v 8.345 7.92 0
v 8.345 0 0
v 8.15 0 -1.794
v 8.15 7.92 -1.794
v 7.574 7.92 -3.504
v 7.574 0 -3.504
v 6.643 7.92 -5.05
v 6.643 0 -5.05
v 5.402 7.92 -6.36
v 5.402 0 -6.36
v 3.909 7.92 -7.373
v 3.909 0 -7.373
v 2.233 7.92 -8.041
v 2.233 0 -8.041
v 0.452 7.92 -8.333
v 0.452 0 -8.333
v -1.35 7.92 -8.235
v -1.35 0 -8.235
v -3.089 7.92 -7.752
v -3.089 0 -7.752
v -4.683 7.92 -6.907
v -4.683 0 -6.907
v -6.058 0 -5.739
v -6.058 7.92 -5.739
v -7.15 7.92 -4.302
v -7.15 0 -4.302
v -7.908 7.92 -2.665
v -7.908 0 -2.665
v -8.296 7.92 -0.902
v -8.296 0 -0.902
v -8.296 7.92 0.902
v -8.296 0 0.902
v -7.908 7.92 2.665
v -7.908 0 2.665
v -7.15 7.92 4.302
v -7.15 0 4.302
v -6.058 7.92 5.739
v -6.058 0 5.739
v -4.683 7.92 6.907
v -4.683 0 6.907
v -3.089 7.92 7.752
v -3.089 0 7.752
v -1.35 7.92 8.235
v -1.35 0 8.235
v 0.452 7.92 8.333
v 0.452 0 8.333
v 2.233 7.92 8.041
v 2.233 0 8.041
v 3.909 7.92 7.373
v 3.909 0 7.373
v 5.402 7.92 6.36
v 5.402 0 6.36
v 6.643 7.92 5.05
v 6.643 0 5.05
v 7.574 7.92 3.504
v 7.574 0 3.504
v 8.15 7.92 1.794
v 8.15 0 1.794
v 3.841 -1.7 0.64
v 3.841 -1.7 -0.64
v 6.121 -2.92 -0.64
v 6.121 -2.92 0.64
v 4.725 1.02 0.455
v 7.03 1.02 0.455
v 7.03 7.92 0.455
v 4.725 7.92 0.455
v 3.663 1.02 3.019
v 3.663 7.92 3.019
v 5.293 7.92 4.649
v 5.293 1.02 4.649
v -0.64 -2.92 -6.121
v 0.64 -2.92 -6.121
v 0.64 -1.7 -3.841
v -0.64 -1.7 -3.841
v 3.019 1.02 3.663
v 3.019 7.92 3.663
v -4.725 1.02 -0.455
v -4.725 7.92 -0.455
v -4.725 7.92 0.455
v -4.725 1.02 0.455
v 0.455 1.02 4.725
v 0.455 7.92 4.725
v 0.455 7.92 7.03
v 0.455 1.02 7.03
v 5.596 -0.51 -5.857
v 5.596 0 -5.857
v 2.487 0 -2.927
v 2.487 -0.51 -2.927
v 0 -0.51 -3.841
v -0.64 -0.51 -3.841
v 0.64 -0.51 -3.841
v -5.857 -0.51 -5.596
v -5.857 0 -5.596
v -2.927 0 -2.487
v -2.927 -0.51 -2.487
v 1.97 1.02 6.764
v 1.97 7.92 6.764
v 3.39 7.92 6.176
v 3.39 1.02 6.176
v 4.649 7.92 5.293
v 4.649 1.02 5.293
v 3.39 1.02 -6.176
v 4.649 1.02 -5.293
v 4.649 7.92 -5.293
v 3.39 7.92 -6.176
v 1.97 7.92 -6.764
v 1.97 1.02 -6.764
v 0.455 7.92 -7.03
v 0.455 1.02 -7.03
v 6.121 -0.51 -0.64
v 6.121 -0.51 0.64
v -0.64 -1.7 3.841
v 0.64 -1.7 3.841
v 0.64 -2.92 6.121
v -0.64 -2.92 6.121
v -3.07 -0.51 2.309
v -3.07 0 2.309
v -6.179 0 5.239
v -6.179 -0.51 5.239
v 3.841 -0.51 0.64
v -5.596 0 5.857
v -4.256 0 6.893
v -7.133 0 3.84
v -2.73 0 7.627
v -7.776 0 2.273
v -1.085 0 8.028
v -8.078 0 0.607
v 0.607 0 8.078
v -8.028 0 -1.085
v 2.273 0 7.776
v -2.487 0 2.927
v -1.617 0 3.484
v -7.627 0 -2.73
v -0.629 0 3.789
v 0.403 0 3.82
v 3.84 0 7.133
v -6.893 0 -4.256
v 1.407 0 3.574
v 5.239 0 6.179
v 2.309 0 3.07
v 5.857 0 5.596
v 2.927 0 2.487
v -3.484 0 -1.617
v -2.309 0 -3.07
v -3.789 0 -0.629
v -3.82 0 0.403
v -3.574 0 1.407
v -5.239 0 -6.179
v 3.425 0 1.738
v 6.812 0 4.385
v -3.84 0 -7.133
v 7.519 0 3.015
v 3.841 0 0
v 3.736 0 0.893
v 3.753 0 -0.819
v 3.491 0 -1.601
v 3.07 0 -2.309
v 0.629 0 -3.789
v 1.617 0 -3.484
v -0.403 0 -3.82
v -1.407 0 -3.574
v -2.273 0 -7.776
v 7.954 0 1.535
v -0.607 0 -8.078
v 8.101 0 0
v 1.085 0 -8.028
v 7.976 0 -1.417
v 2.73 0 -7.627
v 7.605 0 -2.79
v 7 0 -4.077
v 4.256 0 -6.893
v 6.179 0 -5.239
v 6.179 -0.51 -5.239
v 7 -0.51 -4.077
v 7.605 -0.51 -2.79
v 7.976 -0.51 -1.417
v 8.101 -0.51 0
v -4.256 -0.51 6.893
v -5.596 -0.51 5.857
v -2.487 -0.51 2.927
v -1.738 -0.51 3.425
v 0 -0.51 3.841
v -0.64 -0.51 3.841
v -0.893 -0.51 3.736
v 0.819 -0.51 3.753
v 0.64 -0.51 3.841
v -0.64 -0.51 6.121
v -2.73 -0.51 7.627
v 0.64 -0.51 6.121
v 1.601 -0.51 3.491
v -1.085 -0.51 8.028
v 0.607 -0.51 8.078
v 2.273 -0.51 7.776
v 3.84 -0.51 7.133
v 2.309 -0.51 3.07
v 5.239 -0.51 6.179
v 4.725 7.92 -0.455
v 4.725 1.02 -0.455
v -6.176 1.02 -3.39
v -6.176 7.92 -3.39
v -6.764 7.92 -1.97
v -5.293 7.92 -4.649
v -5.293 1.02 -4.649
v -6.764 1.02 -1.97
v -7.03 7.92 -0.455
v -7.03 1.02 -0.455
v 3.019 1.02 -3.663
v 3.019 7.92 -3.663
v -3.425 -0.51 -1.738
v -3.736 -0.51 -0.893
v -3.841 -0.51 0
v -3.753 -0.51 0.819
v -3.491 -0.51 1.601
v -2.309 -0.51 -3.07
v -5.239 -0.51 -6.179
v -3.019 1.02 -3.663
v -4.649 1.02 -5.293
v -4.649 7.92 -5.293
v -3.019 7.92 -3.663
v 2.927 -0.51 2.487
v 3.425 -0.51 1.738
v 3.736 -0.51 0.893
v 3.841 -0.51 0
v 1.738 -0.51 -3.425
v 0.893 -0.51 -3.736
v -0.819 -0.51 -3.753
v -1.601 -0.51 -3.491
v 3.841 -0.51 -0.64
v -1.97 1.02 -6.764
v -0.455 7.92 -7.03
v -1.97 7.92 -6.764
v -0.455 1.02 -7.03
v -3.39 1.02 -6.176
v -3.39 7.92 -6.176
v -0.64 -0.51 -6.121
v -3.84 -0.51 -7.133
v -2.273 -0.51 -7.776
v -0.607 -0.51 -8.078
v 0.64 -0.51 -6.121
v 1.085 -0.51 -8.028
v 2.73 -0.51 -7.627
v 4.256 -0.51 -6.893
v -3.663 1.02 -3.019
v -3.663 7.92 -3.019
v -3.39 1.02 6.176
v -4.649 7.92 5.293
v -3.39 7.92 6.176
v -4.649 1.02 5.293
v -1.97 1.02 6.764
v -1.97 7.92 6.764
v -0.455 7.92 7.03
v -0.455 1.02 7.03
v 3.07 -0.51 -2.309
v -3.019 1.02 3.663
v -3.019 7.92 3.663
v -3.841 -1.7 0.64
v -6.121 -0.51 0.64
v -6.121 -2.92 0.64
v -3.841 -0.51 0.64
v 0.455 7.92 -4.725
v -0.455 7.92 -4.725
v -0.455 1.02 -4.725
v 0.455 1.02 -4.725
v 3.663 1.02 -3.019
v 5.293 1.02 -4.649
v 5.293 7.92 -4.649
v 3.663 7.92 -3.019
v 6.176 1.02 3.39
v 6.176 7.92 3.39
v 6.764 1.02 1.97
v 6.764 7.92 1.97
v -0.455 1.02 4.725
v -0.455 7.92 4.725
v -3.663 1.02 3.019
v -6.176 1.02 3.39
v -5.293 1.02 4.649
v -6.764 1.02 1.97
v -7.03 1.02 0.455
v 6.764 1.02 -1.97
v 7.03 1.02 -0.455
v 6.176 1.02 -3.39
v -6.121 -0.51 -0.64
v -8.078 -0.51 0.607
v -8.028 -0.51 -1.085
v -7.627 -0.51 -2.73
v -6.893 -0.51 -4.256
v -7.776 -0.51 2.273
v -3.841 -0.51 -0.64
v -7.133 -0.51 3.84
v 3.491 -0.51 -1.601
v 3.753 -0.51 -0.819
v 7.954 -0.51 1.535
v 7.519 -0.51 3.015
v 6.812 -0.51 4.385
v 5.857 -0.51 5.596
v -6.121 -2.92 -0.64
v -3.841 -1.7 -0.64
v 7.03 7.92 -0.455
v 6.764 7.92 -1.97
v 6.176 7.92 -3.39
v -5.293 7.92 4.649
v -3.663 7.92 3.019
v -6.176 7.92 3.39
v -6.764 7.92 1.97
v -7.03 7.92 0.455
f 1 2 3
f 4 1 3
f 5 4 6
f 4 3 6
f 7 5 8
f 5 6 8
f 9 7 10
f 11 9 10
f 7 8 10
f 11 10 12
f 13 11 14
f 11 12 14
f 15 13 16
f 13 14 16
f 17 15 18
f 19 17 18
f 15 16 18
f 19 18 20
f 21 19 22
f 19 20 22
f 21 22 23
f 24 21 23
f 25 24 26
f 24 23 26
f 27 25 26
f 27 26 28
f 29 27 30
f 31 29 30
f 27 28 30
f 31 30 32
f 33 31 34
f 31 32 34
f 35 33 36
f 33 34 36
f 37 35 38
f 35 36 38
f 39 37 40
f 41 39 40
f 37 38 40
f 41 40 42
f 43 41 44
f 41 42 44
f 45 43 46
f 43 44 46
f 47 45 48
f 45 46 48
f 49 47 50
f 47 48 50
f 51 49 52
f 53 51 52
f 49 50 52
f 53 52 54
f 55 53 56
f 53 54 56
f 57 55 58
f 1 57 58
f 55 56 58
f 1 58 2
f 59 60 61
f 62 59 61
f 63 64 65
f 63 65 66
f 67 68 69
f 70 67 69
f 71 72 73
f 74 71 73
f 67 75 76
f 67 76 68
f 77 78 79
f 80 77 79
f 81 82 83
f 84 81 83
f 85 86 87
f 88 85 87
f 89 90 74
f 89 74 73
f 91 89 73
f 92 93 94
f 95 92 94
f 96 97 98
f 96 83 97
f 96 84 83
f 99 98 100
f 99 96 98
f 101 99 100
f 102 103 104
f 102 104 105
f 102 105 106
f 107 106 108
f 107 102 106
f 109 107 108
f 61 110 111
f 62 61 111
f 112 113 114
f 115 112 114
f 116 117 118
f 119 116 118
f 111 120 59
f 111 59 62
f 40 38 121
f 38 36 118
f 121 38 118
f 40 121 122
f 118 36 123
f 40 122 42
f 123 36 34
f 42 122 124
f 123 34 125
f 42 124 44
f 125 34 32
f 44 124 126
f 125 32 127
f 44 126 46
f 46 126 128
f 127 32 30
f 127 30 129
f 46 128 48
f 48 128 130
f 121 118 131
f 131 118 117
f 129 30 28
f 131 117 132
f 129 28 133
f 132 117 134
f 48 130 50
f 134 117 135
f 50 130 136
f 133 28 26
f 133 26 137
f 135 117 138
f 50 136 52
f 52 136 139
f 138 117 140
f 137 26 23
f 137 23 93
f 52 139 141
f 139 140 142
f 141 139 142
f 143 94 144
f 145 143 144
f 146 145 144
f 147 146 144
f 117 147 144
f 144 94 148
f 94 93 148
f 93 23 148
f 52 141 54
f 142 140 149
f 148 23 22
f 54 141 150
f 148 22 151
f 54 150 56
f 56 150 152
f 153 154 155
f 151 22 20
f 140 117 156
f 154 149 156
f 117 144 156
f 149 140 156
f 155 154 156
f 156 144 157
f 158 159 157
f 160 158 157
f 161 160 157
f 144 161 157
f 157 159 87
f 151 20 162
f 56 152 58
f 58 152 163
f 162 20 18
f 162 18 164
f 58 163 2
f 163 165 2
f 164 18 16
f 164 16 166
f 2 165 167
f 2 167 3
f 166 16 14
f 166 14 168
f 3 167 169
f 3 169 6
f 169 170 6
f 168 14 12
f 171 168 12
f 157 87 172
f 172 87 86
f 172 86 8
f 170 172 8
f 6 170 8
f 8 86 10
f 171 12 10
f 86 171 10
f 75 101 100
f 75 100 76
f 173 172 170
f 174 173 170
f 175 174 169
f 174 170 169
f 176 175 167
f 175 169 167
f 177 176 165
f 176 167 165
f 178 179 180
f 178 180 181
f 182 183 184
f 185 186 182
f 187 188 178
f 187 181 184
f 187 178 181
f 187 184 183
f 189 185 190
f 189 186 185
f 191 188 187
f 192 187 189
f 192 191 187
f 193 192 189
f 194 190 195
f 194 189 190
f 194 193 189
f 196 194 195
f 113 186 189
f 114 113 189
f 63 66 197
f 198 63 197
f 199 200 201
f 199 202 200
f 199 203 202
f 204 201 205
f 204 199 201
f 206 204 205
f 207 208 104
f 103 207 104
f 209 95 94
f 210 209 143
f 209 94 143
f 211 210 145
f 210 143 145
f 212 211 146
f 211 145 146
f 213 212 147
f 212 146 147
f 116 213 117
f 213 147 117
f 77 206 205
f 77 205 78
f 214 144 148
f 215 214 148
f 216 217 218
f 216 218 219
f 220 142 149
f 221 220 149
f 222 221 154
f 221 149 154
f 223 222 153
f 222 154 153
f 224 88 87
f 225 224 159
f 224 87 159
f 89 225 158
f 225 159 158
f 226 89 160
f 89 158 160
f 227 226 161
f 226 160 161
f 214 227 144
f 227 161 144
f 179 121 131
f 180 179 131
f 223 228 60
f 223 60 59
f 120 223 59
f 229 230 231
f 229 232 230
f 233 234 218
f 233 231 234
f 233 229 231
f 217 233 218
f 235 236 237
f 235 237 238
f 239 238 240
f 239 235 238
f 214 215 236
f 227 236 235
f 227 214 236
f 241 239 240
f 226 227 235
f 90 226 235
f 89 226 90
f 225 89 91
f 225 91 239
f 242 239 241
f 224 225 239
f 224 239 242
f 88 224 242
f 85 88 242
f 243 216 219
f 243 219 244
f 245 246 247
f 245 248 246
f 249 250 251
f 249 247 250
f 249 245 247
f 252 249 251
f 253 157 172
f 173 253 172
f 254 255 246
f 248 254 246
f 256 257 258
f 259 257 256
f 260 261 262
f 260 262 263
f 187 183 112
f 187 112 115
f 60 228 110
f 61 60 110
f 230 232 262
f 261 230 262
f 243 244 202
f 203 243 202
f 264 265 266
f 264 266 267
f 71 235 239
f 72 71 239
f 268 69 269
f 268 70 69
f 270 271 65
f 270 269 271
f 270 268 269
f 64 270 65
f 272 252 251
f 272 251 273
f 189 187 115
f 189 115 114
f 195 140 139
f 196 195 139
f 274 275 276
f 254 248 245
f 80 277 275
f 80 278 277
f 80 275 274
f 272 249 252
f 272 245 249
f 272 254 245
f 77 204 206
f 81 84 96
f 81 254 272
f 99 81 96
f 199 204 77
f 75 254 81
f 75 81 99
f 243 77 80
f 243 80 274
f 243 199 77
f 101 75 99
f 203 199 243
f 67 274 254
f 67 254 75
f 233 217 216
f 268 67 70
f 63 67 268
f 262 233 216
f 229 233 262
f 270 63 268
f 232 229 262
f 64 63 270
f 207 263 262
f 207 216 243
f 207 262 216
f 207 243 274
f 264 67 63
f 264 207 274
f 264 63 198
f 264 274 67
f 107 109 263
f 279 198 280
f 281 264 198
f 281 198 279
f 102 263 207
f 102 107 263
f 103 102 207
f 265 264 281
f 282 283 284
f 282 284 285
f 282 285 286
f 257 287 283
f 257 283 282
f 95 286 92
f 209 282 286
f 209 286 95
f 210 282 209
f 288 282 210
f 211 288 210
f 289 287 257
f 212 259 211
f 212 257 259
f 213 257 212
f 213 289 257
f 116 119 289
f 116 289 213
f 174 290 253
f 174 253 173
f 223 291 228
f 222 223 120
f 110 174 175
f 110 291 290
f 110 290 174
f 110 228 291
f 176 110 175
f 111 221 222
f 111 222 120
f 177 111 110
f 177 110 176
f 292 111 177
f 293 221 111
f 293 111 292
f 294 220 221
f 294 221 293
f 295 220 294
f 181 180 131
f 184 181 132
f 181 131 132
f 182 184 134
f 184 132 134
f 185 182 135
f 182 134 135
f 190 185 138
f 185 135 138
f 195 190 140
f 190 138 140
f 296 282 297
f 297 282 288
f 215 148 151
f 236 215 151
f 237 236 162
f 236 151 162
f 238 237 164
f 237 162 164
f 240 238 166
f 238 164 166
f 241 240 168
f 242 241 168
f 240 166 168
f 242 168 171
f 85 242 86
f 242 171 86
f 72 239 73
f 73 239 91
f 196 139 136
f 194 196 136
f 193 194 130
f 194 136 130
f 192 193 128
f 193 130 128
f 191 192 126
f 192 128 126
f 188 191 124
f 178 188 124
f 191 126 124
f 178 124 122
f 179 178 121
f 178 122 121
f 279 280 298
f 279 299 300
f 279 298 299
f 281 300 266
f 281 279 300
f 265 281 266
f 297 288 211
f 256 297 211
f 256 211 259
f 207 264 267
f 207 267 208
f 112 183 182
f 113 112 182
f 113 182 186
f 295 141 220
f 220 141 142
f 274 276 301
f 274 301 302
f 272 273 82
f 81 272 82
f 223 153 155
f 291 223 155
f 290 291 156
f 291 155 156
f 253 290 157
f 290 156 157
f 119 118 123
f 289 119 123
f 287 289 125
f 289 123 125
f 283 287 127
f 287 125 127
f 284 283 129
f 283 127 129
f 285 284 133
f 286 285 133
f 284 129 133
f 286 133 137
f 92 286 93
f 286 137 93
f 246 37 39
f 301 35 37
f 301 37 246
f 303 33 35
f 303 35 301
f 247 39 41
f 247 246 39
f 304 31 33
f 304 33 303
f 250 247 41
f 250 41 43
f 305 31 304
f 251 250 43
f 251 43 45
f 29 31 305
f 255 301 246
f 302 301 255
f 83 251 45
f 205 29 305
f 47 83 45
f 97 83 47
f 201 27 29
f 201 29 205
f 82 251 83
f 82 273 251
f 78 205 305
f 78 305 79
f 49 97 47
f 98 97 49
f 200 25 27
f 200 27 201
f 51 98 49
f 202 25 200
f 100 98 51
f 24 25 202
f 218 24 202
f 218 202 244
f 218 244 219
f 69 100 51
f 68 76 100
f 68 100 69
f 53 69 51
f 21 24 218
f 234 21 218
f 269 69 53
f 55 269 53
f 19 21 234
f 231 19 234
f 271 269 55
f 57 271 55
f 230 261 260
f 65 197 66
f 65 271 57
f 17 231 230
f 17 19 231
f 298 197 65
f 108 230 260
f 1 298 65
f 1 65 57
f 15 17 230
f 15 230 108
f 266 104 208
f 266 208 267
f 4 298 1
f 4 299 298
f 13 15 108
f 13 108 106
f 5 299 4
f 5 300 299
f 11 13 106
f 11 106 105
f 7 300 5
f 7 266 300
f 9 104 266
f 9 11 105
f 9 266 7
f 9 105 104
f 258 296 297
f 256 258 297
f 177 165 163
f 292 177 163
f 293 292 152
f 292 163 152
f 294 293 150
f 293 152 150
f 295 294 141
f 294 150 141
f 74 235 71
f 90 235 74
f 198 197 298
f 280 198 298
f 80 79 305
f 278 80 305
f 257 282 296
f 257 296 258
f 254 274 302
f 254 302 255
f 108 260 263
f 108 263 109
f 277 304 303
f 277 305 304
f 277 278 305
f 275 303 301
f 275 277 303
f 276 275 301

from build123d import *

# Parameters (mm, degrees)
SKETCH1_R           = 8.345
SKETCH1_R_2         = 7.045
BOSS_EXTRUDE1_DEPTH = 7.92
SKETCH2_R           = 7.045000007
BOSS_EXTRUDE2_DEPTH = 1.02
BOSS_EXTRUDE3_REACH = 16.213
BOSS_EXTRUDE4_DEPTH = 0.51
SKETCH5_W           = 1.28
SKETCH5_H           = 2.28
SKETCH5_W_2         = 2.28
SKETCH5_H_2         = 1.28
BOSS_EXTRUDE5_DEPTH = 2.41
CUT_EXTRUDE1_DEPTH  = 15.597796067
CUT_EXTRUDE2_DEPTH  = 2.41
CUT_EXTRUDE3_DEPTH  = 2.41


with BuildPart() as part:
    # Sketch1 → Boss-Extrude1 (new body)
    with BuildSketch(Plane(origin=(0, 0, 0), x_dir=(1, 0, 0), z_dir=(0, 1, 0))):
        Circle(SKETCH1_R)
        Circle(SKETCH1_R_2, mode=Mode.SUBTRACT)
    extrude(amount=BOSS_EXTRUDE1_DEPTH)

    # Sketch2 → Boss-Extrude2 (add)
    with BuildSketch(Plane(origin=(0, 0, 0), x_dir=(1, 0, 0), z_dir=(0, 1, 0))):
        Circle(SKETCH2_R)
    extrude(amount=BOSS_EXTRUDE2_DEPTH)

    # Sketch3 → Boss-Extrude3 (add, up to next)
    with BuildSketch(Plane(origin=(0, 7.92, 0), x_dir=(1, 0, 0), z_dir=(0, 1, 0)), mode=Mode.PRIVATE) as boss_extrude3_sk1:
        with BuildLine():
            Line((-0.455000106, 4.724999874), (0.455000106, 4.724999874))
            Line((0.455000106, 4.724999874), (0.455000106, 8.332586627))
            ThreePointArc((0.455000106, 8.332586627), (0, 8.345), (-0.455000106, 8.332586627))
            Line((-0.455000106, 8.332586627), (-0.455000106, 4.724999874))
        make_face()
    boss_extrude3_tool1 = extrude(boss_extrude3_sk1.sketch, amount=-BOSS_EXTRUDE3_REACH, mode=Mode.PRIVATE) - part.part
    # Sketch3 → Boss-Extrude3 (add, up to next)
    with BuildSketch(Plane(origin=(0, 7.92, 0), x_dir=(1, 0, 0), z_dir=(0, 1, 0)), mode=Mode.PRIVATE) as boss_extrude3_sk2:
        with BuildLine():
            Line((3.019345792, 3.662813112), (5.570294849, 6.213762169))
            ThreePointArc((5.570294849, 6.213762169), (5.900806089, 5.900806089), (6.213762169, 5.570294849))
            Line((6.213762169, 5.570294849), (3.662813112, 3.019345792))
            Line((3.662813112, 3.019345792), (3.019345792, 3.662813112))
        make_face()
    boss_extrude3_tool2 = extrude(boss_extrude3_sk2.sketch, amount=-BOSS_EXTRUDE3_REACH, mode=Mode.PRIVATE) - part.part
    # Sketch3 → Boss-Extrude3 (add, up to next)
    with BuildSketch(Plane(origin=(0, 7.92, 0), x_dir=(1, 0, 0), z_dir=(0, 1, 0)), mode=Mode.PRIVATE) as boss_extrude3_sk3:
        with BuildLine():
            Line((4.724999874, 0.455000106), (8.332586627, 0.455000106))
            ThreePointArc((8.332586627, 0.455000106), (8.345, 0), (8.332586627, -0.455000106))
            Line((8.332586627, -0.455000106), (4.724999874, -0.455000106))
            Line((4.724999874, -0.455000106), (4.724999874, 0.455000106))
        make_face()
    boss_extrude3_tool3 = extrude(boss_extrude3_sk3.sketch, amount=-BOSS_EXTRUDE3_REACH, mode=Mode.PRIVATE) - part.part
    # Sketch3 → Boss-Extrude3 (add, up to next)
    with BuildSketch(Plane(origin=(0, 7.92, 0), x_dir=(1, 0, 0), z_dir=(0, 1, 0)), mode=Mode.PRIVATE) as boss_extrude3_sk4:
        with BuildLine():
            Line((3.662813112, -3.019345792), (6.213762169, -5.570294849))
            ThreePointArc((6.213762169, -5.570294849), (5.900806089, -5.900806089), (5.570294849, -6.213762169))
            Line((5.570294849, -6.213762169), (3.019345792, -3.662813112))
            Line((3.019345792, -3.662813112), (3.662813112, -3.019345792))
        make_face()
    boss_extrude3_tool4 = extrude(boss_extrude3_sk4.sketch, amount=-BOSS_EXTRUDE3_REACH, mode=Mode.PRIVATE) - part.part
    # Sketch3 → Boss-Extrude3 (add, up to next)
    with BuildSketch(Plane(origin=(0, 7.92, 0), x_dir=(1, 0, 0), z_dir=(0, 1, 0)), mode=Mode.PRIVATE) as boss_extrude3_sk5:
        with BuildLine():
            Line((0.455000106, -4.724999874), (0.455000106, -8.332586627))
            ThreePointArc((0.455000106, -8.332586627), (0, -8.345), (-0.455000106, -8.332586627))
            Line((-0.455000106, -8.332586627), (-0.455000106, -4.724999874))
            Line((-0.455000106, -4.724999874), (0.455000106, -4.724999874))
        make_face()
    boss_extrude3_tool5 = extrude(boss_extrude3_sk5.sketch, amount=-BOSS_EXTRUDE3_REACH, mode=Mode.PRIVATE) - part.part
    # Sketch3 → Boss-Extrude3 (add, up to next)
    with BuildSketch(Plane(origin=(0, 7.92, 0), x_dir=(1, 0, 0), z_dir=(0, 1, 0)), mode=Mode.PRIVATE) as boss_extrude3_sk6:
        with BuildLine():
            Line((-3.019345792, -3.662813112), (-5.570294849, -6.213762169))
            ThreePointArc((-5.570294849, -6.213762169), (-5.900806089, -5.900806089), (-6.213762169, -5.570294849))
            Line((-6.213762169, -5.570294849), (-3.662813112, -3.019345792))
            Line((-3.662813112, -3.019345792), (-3.019345792, -3.662813112))
        make_face()
    boss_extrude3_tool6 = extrude(boss_extrude3_sk6.sketch, amount=-BOSS_EXTRUDE3_REACH, mode=Mode.PRIVATE) - part.part
    # Sketch3 → Boss-Extrude3 (add, up to next)
    with BuildSketch(Plane(origin=(0, 7.92, 0), x_dir=(1, 0, 0), z_dir=(0, 1, 0)), mode=Mode.PRIVATE) as boss_extrude3_sk7:
        with BuildLine():
            Line((-4.724999874, -0.455000106), (-8.332586627, -0.455000106))
            ThreePointArc((-8.332586627, -0.455000106), (-8.345, 0), (-8.332586627, 0.455000106))
            Line((-8.332586627, 0.455000106), (-4.724999874, 0.455000106))
            Line((-4.724999874, 0.455000106), (-4.724999874, -0.455000106))
        make_face()
    boss_extrude3_tool7 = extrude(boss_extrude3_sk7.sketch, amount=-BOSS_EXTRUDE3_REACH, mode=Mode.PRIVATE) - part.part
    # Sketch3 → Boss-Extrude3 (add, up to next)
    with BuildSketch(Plane(origin=(0, 7.92, 0), x_dir=(1, 0, 0), z_dir=(0, 1, 0)), mode=Mode.PRIVATE) as boss_extrude3_sk8:
        with BuildLine():
            Line((-3.662813112, 3.019345792), (-6.213762169, 5.570294849))
            ThreePointArc((-6.213762169, 5.570294849), (-5.900806089, 5.900806089), (-5.570294849, 6.213762169))
            Line((-5.570294849, 6.213762169), (-3.019345792, 3.662813112))
            Line((-3.019345792, 3.662813112), (-3.662813112, 3.019345792))
        make_face()
    boss_extrude3_tool8 = extrude(boss_extrude3_sk8.sketch, amount=-BOSS_EXTRUDE3_REACH, mode=Mode.PRIVATE) - part.part
    add(boss_extrude3_tool1.solids().sort_by_distance((0, 7.92, -6.532934))[0])
    add(boss_extrude3_tool2.solids().sort_by_distance((4.619482, 7.92, -4.619482))[0])
    add(boss_extrude3_tool3.solids().sort_by_distance((6.532934, 7.92, 0))[0])
    add(boss_extrude3_tool4.solids().sort_by_distance((4.619482, 7.92, 4.619482))[0])
    add(boss_extrude3_tool5.solids().sort_by_distance((0, 7.92, 6.532934))[0])
    add(boss_extrude3_tool6.solids().sort_by_distance((-4.619482, 7.92, 4.619482))[0])
    add(boss_extrude3_tool7.solids().sort_by_distance((-6.532934, 7.92, 0))[0])
    add(boss_extrude3_tool8.solids().sort_by_distance((-4.619482, 7.92, -4.619482))[0])

    # Sketch4 → Boss-Extrude4 (add)
    with BuildSketch(Plane.XZ):
        with BuildLine():
            ThreePointArc((6.179087875, -5.238791894), (8.097423758, 0.240407921), (5.857404636, 5.596148534))
            Line((5.857404636, 5.596148534), (2.927325729, 2.486761301))
            ThreePointArc((2.927325729, 2.486761301), (3.839300032, 0.113986642), (3.069700642, -2.308712987))
            Line((3.069700642, -2.308712987), (6.179087875, -5.238791894))
        make_face()
        with BuildLine():
            Line((2.308712987, 3.069700642), (5.238791894, 6.179087875))
            ThreePointArc((5.238791894, 6.179087875), (-0.240407921, 8.097423758), (-5.596148534, 5.857404636))
            Line((-5.596148534, 5.857404636), (-2.486761301, 2.927325729))
            ThreePointArc((-2.486761301, 2.927325729), (-0.113986642, 3.839300032), (2.308712987, 3.069700642))
        make_face()
        with BuildLine():
            Line((-3.069700642, 2.308712987), (-6.179087875, 5.238791894))
            ThreePointArc((-6.179087875, 5.238791894), (-8.097423758, -0.240407921), (-5.857404636, -5.596148534))
            Line((-5.857404636, -5.596148534), (-2.927325729, -2.486761301))
            ThreePointArc((-2.927325729, -2.486761301), (-3.839300032, -0.113986642), (-3.069700642, 2.308712987))
        make_face()
        with BuildLine():
            ThreePointArc((-5.238791894, -6.179087875), (0.240407921, -8.097423758), (5.596148534, -5.857404636))
            Line((5.596148534, -5.857404636), (2.486761301, -2.927325729))
            ThreePointArc((2.486761301, -2.927325729), (0.113986642, -3.839300032), (-2.308712987, -3.069700642))
            Line((-2.308712987, -3.069700642), (-5.238791894, -6.179087875))
        make_face()
    extrude(amount=BOSS_EXTRUDE4_DEPTH)

    # Sketch5 → Boss-Extrude5 (add)
    with BuildSketch(Plane.XZ.offset(0.51)):
        with Locations((0, 4.98099181)):
            Rectangle(SKETCH5_W, SKETCH5_H)
        with Locations((4.98099181, 0)):
            Rectangle(SKETCH5_W_2, SKETCH5_H_2)
        with Locations((0, -4.98099181)):
            Rectangle(SKETCH5_W, SKETCH5_H)
        with Locations((-4.98099181, 0)):
            Rectangle(SKETCH5_W_2, SKETCH5_H_2)
    extrude(amount=BOSS_EXTRUDE5_DEPTH)

    # Sketch6 → Cut-Extrude1 (cut, through all)
    with BuildSketch(Plane(origin=(0, 0, -0.64), x_dir=(-1, 0, 0), z_dir=(0, 0, -1))):
        Polygon((6.12099181, -2.92), (3.84099181, -1.7), (3.84099181, -2.92), align=None)
    extrude(amount=-CUT_EXTRUDE1_DEPTH, mode=Mode.SUBTRACT)

    # Sketch7 → Cut-Extrude2 (cut)
    with BuildSketch(Plane(origin=(0.64, 0, 0), x_dir=(0, 0, -1), z_dir=(1, 0, 0))):
        Polygon((6.12099181, -2.92), (3.84099181, -1.7), (3.84099181, -2.92), align=None)
        Polygon((-3.84099181, -2.92), (-3.84099181, -1.7), (-6.12099181, -2.92), align=None)
    extrude(amount=-CUT_EXTRUDE2_DEPTH, mode=Mode.SUBTRACT)

    # Sketch6<3> → Cut-Extrude3 (cut)
    with BuildSketch(Plane(origin=(0, 0, -0.64), x_dir=(-1, 0, 0), z_dir=(0, 0, -1))):
        Polygon((-3.84099181, -2.92), (-3.84099181, -1.7), (-6.12099181, -2.92), align=None)
    extrude(amount=-CUT_EXTRUDE3_DEPTH, mode=Mode.SUBTRACT)


solid = part.part
